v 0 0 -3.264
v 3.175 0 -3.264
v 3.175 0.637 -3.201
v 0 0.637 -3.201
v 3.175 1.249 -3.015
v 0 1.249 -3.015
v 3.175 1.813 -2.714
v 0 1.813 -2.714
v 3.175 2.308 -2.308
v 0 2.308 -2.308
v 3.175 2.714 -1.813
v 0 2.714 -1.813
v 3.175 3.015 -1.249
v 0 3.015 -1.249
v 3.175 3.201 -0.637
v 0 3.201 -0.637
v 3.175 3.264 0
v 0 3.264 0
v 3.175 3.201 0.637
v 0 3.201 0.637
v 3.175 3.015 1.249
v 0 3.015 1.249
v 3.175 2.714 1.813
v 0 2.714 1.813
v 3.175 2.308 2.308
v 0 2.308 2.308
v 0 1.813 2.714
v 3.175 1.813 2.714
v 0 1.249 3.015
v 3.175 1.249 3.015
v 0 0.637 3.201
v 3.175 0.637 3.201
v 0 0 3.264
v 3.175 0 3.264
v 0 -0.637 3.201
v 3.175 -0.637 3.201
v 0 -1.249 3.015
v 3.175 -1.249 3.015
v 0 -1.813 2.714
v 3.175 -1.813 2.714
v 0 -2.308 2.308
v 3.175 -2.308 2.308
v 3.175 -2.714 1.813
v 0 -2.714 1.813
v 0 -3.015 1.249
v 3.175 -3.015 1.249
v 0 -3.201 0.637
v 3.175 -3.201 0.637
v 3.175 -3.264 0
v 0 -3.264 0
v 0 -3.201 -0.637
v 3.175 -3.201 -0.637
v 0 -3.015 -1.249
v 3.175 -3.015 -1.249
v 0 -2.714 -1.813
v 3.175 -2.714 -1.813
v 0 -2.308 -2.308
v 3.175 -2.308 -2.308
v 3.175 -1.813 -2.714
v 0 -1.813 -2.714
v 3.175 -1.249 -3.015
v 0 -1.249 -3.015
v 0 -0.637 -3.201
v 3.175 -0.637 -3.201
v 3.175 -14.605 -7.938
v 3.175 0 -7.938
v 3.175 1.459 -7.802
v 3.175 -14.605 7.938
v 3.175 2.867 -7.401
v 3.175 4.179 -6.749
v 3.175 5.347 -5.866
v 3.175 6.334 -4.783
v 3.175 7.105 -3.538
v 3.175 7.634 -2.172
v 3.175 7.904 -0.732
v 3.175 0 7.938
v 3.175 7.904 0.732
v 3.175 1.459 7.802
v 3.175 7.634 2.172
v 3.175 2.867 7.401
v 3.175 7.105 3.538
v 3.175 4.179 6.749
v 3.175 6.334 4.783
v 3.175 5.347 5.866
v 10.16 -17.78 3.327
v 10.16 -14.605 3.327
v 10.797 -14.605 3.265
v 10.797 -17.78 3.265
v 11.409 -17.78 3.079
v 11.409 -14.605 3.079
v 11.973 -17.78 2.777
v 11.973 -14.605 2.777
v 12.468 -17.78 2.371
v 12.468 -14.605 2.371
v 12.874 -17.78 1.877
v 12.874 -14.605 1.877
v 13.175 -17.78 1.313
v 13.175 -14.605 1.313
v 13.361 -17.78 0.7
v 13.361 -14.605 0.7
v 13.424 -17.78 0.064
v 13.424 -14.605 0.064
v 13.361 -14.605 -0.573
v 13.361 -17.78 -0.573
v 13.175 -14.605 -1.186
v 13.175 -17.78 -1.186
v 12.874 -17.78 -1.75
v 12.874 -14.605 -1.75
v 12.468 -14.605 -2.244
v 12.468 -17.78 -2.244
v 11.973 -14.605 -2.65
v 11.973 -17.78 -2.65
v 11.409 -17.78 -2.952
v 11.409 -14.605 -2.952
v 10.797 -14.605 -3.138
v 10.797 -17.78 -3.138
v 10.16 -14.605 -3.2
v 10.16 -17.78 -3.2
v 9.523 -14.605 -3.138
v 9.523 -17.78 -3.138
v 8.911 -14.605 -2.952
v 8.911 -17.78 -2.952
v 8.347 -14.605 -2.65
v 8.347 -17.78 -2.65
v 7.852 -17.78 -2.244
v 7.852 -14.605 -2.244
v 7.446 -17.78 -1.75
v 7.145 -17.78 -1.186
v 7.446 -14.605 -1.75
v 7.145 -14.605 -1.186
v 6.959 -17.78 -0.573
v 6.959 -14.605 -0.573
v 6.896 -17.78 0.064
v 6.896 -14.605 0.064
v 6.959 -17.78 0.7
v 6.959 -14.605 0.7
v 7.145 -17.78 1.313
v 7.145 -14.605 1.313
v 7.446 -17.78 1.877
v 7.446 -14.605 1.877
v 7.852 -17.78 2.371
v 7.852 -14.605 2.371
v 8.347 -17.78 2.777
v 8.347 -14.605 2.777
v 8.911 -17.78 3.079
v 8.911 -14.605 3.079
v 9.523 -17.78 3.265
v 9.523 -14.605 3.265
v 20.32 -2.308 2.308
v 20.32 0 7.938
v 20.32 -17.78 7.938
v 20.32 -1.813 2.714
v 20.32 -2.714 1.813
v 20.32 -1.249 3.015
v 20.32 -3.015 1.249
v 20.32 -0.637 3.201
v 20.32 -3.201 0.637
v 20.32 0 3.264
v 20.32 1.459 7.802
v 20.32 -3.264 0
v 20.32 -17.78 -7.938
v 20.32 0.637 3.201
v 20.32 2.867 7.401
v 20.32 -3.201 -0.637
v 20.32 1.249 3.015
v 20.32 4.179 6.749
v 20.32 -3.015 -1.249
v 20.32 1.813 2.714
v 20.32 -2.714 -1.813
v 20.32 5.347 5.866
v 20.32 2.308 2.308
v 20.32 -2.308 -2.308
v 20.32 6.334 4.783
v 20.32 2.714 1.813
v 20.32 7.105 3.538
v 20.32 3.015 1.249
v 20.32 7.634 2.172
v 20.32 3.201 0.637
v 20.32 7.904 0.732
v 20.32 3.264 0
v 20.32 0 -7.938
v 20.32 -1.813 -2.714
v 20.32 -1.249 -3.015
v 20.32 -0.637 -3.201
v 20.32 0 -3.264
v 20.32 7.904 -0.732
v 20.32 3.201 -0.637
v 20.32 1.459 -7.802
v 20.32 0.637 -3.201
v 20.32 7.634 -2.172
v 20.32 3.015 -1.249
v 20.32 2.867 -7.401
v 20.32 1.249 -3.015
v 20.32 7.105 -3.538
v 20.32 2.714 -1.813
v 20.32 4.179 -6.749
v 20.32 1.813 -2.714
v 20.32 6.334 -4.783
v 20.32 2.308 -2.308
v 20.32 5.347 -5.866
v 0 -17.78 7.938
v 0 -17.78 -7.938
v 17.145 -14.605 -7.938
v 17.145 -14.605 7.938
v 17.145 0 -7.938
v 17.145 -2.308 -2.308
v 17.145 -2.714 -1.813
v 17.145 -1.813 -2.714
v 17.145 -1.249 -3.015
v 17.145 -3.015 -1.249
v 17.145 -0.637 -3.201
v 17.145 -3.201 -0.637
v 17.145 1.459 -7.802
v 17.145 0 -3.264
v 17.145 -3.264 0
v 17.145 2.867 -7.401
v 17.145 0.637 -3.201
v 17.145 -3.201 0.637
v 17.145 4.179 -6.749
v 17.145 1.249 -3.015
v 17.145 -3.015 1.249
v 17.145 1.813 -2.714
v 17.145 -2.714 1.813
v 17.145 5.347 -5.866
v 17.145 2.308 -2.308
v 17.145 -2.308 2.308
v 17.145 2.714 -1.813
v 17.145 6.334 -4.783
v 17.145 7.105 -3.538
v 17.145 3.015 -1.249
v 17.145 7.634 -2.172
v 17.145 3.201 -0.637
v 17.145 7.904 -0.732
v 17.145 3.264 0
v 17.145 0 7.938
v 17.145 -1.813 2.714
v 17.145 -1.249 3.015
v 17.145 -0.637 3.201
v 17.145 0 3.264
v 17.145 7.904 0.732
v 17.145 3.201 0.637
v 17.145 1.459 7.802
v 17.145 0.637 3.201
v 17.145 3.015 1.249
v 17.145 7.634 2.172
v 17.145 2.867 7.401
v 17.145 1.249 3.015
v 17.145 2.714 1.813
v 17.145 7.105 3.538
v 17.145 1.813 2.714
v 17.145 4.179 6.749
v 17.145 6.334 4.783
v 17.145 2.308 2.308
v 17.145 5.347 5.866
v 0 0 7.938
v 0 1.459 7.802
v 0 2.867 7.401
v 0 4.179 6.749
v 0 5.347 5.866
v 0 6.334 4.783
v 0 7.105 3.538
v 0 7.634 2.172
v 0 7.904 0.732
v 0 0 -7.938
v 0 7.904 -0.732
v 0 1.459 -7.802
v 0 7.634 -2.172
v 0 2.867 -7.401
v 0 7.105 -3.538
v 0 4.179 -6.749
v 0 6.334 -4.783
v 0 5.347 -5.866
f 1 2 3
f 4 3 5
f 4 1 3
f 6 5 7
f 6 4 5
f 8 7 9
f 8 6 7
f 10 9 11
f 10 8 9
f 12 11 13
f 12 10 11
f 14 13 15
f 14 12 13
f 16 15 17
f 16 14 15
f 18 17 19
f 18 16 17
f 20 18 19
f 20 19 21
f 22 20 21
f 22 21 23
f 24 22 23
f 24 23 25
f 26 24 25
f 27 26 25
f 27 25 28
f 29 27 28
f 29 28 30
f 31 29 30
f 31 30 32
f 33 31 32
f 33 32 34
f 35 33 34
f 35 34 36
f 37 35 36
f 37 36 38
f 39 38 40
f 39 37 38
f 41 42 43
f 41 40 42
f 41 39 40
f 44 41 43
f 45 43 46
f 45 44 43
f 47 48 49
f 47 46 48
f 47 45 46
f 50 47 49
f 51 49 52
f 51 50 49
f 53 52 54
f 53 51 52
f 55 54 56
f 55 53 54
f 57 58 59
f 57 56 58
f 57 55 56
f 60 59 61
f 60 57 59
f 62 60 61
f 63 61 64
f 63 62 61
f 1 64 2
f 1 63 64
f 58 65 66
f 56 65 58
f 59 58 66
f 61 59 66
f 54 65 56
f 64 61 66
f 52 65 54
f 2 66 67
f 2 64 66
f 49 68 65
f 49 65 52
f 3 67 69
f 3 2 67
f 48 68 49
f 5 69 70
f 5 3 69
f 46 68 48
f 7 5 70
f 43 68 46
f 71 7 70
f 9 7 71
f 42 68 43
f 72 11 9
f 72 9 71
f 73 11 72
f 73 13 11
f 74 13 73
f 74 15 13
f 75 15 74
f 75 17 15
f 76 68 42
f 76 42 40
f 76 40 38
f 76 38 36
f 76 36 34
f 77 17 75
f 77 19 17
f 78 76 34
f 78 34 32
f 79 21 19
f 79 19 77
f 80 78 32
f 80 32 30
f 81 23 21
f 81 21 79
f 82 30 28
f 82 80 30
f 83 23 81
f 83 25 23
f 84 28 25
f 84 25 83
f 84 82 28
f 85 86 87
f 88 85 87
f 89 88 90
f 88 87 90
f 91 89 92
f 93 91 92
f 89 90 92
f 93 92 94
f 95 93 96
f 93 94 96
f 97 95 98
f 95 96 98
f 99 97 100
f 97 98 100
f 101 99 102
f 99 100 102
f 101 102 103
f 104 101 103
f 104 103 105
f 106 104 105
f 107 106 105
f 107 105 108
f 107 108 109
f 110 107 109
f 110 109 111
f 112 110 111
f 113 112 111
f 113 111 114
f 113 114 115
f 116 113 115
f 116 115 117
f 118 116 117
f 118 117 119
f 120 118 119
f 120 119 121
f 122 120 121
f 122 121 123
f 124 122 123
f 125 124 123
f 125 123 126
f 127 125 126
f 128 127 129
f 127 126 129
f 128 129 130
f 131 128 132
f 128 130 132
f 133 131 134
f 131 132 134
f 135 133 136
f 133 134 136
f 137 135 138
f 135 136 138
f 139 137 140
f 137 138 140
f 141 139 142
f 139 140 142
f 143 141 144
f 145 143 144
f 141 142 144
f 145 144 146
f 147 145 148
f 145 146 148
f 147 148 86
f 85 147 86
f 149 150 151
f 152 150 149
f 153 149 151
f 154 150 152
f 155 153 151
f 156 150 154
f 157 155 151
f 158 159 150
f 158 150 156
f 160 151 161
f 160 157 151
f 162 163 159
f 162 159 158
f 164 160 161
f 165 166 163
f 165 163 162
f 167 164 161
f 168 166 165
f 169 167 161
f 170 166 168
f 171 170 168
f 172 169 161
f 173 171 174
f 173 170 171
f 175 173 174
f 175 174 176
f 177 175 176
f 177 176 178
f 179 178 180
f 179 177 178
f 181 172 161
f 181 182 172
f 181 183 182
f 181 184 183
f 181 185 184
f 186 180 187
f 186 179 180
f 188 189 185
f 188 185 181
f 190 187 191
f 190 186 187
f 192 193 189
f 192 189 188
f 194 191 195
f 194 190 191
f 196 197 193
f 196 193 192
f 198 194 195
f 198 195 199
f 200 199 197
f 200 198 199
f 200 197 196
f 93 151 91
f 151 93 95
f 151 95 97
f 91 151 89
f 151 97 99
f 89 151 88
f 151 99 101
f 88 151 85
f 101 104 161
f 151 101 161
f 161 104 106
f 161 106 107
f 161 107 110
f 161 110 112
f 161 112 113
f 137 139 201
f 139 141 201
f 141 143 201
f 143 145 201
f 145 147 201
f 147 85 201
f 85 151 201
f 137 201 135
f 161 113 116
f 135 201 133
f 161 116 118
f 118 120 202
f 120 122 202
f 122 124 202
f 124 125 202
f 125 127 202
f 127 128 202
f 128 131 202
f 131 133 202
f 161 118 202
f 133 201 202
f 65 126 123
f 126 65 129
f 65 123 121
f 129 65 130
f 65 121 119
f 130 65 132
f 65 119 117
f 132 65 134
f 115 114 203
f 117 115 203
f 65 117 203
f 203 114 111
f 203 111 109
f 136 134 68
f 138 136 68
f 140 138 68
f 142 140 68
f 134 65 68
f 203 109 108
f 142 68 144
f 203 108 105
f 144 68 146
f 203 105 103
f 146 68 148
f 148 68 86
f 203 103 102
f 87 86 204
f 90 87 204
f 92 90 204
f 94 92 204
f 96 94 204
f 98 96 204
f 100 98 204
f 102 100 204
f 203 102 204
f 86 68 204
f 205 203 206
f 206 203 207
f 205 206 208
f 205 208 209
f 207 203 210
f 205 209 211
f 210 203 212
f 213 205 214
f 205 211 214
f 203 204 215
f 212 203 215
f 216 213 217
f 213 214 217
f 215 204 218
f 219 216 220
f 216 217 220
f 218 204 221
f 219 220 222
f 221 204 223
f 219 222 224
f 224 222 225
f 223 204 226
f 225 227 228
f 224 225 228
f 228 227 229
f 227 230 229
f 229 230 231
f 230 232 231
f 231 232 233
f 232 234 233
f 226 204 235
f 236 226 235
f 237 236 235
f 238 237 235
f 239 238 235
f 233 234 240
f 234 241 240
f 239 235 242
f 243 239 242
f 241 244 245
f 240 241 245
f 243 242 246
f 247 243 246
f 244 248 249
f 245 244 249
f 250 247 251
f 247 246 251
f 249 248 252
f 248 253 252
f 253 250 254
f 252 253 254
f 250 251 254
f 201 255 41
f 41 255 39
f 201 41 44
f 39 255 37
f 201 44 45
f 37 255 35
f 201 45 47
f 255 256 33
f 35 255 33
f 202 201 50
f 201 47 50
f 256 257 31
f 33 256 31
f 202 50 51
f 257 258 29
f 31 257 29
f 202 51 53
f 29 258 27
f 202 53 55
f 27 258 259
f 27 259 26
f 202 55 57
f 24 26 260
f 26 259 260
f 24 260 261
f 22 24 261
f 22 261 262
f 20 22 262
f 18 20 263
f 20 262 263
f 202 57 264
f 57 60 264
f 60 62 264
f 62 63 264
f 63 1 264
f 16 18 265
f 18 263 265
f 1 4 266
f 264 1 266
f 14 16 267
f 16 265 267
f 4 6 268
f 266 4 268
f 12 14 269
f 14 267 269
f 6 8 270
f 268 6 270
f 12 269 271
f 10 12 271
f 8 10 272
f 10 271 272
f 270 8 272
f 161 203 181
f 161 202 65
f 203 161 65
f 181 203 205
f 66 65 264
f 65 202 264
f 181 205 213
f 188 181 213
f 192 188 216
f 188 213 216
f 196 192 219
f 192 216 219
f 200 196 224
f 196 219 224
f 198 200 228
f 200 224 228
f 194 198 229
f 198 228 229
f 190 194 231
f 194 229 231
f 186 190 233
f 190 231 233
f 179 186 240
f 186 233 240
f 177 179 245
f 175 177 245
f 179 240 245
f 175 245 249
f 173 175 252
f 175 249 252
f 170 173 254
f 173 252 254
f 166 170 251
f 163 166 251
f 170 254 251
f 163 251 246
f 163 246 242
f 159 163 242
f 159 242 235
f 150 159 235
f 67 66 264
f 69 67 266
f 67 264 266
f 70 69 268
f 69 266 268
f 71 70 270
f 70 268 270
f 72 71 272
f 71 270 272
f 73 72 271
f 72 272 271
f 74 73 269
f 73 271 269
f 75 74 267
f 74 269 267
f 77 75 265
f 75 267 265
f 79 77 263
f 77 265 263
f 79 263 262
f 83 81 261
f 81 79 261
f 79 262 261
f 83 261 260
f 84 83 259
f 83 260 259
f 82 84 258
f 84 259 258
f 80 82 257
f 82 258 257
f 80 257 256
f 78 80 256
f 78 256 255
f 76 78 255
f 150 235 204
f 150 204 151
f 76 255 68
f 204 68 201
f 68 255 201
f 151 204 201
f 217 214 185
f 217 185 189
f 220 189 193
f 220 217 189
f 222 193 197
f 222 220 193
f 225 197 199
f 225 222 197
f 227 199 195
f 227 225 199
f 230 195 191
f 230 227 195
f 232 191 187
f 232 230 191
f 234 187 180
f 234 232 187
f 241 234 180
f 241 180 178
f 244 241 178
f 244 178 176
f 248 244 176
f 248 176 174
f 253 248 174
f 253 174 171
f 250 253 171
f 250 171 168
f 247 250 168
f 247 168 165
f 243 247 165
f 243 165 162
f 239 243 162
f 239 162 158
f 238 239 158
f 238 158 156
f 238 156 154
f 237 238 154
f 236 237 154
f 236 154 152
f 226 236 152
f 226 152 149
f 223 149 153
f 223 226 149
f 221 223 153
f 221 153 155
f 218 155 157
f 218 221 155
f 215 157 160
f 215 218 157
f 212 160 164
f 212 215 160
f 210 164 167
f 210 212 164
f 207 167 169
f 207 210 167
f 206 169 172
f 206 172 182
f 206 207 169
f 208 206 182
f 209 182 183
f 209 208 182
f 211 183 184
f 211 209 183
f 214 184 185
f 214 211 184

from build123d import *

# Parameters (mm, degrees)
SKETCH2_R           = 7.9375
SKETCH2_R_2         = 3.2639
BOSS_EXTRUDE1_DEPTH = 20.32
SKETCH3_W           = 13.97
SKETCH3_H           = 25.4
CUT_EXTRUDE1_DEPTH  = 12.7
SKETCH4_R           = 3.2639
CUT_EXTRUDE2_DEPTH  = 29.143111169


with BuildPart() as part:
    # Sketch2 → Boss-Extrude1 (new body)
    # profile 1 of 2: a face of its own
    with BuildSketch(Plane(origin=(0, 0, 0), x_dir=(0, 0, -1), z_dir=(1, 0, 0))):
        with BuildLine():
            ThreePointArc((7.9375, 0), (0, -7.9375), (-7.9375, 0))
            Line((-7.9375, 0), (-7.9375, -17.78))
            Line((-7.9375, -17.78), (7.9375, -17.78))
            Line((7.9375, -17.78), (7.9375, 0))
        make_face()
    # profile 2 of 2: a face of its own
    with BuildSketch(Plane(origin=(0, 0, 0), x_dir=(0, 0, -1), z_dir=(1, 0, 0))):
        Circle(SKETCH2_R)
        Circle(SKETCH2_R_2, mode=Mode.SUBTRACT)
    extrude(amount=BOSS_EXTRUDE1_DEPTH)

    # Sketch3 → Cut-Extrude1 (cut, symmetric)
    with BuildSketch(Plane.XY):
        with Locations((10.16, -1.905)):
            Rectangle(SKETCH3_W, SKETCH3_H)
    extrude(amount=CUT_EXTRUDE1_DEPTH, both=True, mode=Mode.SUBTRACT)

    # Sketch4 → Cut-Extrude2 (cut, through all)
    with BuildSketch(Plane(origin=(0, 0, 0), x_dir=(1, 0, 0), z_dir=(0, 1, 0))):
        with Locations(Location((10.16, -0.0635, 0), (0, 0, 270))):
            Circle(SKETCH4_R)
    extrude(amount=-CUT_EXTRUDE2_DEPTH, mode=Mode.SUBTRACT)


solid = part.part
